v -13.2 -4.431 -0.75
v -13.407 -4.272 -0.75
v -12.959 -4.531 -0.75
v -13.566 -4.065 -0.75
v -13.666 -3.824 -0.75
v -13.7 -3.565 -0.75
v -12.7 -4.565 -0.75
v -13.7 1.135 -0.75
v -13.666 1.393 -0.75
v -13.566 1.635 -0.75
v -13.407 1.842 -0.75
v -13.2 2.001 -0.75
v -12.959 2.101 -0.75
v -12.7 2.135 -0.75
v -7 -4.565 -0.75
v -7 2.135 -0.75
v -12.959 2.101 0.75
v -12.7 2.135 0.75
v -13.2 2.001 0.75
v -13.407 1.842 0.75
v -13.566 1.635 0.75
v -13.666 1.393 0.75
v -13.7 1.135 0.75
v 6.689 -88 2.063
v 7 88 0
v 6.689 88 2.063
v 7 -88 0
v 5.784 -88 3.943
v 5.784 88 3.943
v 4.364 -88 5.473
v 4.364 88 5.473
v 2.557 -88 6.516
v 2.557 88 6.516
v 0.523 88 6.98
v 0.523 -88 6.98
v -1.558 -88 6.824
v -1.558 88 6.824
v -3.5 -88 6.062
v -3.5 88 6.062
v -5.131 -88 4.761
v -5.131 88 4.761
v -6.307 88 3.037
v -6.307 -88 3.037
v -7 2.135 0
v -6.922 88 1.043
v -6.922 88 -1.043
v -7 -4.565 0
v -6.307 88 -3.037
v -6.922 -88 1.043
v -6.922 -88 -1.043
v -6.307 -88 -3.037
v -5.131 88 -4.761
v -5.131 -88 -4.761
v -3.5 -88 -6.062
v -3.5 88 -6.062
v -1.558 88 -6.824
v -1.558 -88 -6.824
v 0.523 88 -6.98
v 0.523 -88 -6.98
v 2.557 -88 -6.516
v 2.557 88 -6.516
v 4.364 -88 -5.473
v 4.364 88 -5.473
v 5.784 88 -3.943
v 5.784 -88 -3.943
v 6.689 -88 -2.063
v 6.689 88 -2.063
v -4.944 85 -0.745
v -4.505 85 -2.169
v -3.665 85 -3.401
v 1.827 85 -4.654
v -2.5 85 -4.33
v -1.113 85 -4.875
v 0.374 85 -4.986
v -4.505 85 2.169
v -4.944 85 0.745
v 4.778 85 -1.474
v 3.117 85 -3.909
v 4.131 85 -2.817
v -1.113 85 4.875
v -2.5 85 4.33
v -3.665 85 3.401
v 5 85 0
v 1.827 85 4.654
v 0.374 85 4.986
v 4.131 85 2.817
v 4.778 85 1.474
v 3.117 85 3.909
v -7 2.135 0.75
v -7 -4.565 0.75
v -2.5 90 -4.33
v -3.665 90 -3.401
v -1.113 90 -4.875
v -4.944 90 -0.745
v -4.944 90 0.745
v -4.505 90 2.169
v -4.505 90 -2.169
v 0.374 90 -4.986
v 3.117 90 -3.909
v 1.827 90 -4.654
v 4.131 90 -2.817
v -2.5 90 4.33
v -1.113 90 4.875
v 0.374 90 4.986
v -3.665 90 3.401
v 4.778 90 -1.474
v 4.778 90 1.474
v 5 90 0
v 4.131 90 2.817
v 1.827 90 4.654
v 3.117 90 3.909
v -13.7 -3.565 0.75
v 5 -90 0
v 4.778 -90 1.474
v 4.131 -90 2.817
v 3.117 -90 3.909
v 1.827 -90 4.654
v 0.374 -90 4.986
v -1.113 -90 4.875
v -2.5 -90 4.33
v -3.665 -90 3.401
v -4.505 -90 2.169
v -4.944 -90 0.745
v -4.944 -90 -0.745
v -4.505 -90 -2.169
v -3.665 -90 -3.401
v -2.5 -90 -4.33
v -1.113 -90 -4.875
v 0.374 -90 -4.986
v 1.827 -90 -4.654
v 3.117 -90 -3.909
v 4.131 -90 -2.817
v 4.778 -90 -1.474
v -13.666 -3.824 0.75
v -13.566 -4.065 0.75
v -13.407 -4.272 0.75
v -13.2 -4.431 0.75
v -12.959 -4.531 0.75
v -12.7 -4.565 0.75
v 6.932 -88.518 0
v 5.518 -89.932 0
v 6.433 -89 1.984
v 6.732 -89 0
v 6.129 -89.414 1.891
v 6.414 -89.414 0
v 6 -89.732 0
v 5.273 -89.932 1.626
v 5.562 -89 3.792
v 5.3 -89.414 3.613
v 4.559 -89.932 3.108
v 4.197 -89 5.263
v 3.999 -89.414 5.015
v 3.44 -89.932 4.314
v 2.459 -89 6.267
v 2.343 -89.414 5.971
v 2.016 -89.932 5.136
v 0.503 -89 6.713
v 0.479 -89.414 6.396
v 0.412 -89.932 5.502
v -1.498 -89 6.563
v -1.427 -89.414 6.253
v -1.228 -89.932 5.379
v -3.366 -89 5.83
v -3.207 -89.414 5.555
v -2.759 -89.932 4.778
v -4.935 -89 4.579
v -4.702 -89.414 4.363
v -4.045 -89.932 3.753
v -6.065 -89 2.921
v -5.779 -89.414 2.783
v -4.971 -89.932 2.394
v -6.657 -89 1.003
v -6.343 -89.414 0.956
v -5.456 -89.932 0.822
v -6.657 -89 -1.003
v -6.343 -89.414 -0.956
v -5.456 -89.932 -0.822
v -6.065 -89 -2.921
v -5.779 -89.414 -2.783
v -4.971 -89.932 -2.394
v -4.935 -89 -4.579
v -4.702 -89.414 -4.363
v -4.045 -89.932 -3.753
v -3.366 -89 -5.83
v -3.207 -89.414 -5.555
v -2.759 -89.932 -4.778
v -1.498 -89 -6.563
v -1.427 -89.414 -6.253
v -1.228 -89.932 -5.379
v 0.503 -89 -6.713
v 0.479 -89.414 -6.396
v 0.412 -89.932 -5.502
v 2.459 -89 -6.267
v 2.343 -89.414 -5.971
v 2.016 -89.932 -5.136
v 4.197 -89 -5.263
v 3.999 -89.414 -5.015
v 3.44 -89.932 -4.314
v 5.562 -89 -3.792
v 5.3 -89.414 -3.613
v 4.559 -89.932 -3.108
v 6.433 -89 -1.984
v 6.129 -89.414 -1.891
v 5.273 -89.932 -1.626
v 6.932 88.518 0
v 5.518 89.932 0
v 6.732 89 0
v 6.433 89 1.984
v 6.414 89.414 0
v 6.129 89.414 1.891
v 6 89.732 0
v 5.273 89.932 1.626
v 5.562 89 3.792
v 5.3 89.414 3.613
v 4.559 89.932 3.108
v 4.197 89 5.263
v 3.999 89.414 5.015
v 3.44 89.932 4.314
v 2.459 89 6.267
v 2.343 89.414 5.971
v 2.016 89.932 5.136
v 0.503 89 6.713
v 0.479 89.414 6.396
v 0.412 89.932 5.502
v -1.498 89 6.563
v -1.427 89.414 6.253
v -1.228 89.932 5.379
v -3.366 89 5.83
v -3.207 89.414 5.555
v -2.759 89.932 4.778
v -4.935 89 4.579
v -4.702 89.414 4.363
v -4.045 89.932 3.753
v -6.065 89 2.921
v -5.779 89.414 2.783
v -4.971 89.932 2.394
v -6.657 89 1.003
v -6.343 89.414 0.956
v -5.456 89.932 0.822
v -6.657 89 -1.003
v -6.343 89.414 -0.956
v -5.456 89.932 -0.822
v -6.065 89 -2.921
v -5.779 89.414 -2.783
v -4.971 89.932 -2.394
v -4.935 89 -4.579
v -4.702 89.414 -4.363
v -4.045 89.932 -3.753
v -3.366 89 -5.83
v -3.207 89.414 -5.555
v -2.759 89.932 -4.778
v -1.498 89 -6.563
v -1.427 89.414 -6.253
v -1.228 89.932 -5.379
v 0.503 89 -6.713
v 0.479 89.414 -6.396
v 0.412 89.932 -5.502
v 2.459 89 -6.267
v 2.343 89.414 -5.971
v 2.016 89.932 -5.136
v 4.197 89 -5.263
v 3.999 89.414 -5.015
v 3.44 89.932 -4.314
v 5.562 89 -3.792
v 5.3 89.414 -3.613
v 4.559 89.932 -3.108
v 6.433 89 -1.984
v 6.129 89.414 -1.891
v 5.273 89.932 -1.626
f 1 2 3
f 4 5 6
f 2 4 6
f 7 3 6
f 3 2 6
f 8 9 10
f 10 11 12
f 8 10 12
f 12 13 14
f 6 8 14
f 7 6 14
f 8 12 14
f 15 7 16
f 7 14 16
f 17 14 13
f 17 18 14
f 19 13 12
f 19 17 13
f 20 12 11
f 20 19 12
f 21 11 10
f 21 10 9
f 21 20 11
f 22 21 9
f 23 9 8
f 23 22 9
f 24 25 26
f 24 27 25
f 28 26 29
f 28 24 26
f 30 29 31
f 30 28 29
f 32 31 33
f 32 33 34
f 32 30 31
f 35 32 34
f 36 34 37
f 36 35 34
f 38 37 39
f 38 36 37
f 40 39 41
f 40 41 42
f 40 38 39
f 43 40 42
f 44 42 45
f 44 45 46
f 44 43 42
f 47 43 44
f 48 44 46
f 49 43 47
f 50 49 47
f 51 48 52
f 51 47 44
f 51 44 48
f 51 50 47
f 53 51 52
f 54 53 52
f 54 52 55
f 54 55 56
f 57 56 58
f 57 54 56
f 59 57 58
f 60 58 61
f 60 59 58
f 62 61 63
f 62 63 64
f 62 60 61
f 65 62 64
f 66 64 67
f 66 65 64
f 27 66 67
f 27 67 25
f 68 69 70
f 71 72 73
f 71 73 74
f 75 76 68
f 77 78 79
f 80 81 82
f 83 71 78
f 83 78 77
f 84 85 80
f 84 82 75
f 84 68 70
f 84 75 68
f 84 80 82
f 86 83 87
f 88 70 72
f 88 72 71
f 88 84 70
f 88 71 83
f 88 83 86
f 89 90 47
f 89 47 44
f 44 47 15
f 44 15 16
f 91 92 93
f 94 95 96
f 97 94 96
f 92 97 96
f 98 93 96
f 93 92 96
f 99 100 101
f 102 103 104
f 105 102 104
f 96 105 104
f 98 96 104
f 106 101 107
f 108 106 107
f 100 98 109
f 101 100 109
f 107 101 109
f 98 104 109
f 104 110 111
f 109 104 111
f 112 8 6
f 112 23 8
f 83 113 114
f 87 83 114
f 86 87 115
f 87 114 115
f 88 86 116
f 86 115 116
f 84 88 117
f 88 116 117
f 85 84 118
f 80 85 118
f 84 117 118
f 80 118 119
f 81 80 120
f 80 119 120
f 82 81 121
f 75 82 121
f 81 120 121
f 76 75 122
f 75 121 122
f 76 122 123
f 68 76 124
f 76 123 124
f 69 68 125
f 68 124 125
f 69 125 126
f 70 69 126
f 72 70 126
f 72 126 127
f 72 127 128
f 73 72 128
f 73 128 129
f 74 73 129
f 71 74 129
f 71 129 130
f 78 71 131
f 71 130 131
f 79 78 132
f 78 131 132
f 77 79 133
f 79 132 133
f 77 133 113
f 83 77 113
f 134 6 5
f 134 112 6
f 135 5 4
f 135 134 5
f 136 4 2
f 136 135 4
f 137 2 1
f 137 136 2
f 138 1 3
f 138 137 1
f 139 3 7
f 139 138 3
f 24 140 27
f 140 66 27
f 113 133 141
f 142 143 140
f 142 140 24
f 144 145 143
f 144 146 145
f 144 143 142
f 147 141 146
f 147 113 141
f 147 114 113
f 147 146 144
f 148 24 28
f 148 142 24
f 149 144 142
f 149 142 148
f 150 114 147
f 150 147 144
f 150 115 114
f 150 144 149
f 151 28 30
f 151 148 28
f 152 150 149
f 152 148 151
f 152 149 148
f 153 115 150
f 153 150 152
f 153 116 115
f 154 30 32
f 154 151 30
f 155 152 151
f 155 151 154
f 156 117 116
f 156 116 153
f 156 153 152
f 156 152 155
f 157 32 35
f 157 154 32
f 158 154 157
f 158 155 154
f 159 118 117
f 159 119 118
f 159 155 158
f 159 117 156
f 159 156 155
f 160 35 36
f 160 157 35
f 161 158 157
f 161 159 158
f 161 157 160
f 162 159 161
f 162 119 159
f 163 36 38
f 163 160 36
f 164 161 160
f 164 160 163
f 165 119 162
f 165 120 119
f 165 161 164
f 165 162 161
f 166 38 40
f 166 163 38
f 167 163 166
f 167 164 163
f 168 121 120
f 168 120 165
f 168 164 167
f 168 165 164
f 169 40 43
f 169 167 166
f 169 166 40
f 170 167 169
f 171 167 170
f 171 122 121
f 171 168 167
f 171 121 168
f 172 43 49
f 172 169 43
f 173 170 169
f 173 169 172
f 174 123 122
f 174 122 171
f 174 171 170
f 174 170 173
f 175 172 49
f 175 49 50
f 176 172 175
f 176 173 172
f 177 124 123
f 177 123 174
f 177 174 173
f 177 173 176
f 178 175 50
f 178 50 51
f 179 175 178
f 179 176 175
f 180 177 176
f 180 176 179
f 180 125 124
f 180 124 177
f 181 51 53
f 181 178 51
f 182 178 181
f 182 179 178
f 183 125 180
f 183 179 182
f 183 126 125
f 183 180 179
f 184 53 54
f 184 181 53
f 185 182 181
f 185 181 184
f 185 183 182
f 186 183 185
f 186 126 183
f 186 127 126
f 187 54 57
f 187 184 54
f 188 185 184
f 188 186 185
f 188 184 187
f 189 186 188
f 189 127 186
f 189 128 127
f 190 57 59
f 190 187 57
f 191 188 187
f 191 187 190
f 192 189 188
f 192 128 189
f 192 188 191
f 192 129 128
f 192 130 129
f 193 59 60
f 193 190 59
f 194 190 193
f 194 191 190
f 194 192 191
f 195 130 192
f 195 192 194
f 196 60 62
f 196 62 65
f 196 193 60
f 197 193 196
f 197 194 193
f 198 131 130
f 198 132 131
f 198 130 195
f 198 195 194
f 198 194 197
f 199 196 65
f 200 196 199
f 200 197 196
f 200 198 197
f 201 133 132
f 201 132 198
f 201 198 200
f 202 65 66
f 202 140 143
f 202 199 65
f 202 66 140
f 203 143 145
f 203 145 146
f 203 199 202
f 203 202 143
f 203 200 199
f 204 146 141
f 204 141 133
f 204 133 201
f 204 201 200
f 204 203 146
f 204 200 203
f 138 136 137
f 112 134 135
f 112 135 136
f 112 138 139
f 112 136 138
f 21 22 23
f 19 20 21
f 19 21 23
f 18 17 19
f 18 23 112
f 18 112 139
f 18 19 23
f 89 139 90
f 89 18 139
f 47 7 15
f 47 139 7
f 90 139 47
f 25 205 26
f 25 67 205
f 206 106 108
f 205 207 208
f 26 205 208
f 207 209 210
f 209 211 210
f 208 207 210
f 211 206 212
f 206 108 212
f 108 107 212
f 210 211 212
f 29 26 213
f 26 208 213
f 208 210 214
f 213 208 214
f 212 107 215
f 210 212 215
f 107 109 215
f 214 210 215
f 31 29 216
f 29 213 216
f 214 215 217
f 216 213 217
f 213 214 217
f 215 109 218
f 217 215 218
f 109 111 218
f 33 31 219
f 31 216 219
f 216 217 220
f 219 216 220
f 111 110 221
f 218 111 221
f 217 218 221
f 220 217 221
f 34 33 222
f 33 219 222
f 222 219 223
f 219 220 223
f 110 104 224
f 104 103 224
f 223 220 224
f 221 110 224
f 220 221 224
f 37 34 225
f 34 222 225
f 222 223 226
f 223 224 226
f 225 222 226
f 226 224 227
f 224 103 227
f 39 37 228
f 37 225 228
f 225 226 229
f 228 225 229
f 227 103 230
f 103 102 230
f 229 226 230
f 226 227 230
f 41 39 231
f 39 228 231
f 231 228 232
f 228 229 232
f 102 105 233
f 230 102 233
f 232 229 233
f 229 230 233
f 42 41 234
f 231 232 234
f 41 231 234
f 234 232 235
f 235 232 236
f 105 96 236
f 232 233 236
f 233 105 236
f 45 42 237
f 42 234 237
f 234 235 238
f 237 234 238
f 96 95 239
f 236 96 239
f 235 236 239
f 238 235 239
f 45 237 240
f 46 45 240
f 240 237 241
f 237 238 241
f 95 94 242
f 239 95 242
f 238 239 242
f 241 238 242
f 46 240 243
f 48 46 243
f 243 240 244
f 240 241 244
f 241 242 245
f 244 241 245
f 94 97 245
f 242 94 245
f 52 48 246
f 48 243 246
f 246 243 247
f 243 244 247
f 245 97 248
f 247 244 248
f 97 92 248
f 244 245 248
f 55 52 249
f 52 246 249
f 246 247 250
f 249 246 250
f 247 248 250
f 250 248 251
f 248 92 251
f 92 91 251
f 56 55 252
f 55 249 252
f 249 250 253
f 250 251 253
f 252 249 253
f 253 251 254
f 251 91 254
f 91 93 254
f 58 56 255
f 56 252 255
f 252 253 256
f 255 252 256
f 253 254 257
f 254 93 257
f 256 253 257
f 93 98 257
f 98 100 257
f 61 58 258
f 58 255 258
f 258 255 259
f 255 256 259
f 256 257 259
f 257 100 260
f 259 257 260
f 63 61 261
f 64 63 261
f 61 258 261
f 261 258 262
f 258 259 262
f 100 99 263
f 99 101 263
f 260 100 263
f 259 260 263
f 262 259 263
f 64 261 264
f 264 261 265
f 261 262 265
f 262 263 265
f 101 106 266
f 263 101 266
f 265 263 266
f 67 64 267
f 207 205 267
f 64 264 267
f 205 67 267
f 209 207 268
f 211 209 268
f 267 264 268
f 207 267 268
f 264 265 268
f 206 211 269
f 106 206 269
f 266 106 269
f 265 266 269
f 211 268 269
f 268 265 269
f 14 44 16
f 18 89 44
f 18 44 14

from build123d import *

# Parameters (mm, degrees)
F0_R     = 7
F0_R_2   = 5
F1_DEPTH = 90
F2_R     = 5
F3_DEPTH = 175
F4_R     = 1.99999
F6_DEPTH = 0.75
F7_R     = 1


# Not quite as in the source:
# - a fillet or chamfer is up to 0.001 mm smaller than in the source, because OpenCascade refuses the exact size


with BuildPart() as f1:
    # F0 (on Front) → F1 (new body, symmetric)
    with BuildSketch(Plane.XZ):
        Circle(F0_R)
        Circle(F0_R_2, mode=Mode.SUBTRACT)
        Circle(F0_R_2)
    extrude(amount=F1_DEPTH, both=True)

    # F2 (on face) → F3 (cut)
    with BuildSketch(Plane.XZ.offset(90)):
        Circle(F2_R)
    extrude(amount=-F3_DEPTH, mode=Mode.SUBTRACT)

    # F4 (radius 2 in the source; OpenCascade refuses exactly that, so slightly less here)
    f4_edges = [f1.edges().sort_by_distance(p)[0] for p in [
        (-7, 90, 0),
        (-7, -90, 0),
    ]]
    fillet(f4_edges, radius=F4_R)

    # F5 (on Top) → F6 (join, symmetric)
    with BuildSketch(Plane.XY):
        Polygon((-7, 0), (-7, 2.1346567392), (-13.7, 2.1346567392), (-13.7, -4.5653432608), (-7, -4.5653432608), align=None)
    extrude(amount=F6_DEPTH, both=True)

    # F7
    f7_edges = [f1.edges().sort_by_distance(p)[0] for p in [
        (-13.7, 2.134657, 0),
        (-13.7, -4.565343, 0),
    ]]
    fillet(f7_edges, radius=F7_R)


solid = f1.part
